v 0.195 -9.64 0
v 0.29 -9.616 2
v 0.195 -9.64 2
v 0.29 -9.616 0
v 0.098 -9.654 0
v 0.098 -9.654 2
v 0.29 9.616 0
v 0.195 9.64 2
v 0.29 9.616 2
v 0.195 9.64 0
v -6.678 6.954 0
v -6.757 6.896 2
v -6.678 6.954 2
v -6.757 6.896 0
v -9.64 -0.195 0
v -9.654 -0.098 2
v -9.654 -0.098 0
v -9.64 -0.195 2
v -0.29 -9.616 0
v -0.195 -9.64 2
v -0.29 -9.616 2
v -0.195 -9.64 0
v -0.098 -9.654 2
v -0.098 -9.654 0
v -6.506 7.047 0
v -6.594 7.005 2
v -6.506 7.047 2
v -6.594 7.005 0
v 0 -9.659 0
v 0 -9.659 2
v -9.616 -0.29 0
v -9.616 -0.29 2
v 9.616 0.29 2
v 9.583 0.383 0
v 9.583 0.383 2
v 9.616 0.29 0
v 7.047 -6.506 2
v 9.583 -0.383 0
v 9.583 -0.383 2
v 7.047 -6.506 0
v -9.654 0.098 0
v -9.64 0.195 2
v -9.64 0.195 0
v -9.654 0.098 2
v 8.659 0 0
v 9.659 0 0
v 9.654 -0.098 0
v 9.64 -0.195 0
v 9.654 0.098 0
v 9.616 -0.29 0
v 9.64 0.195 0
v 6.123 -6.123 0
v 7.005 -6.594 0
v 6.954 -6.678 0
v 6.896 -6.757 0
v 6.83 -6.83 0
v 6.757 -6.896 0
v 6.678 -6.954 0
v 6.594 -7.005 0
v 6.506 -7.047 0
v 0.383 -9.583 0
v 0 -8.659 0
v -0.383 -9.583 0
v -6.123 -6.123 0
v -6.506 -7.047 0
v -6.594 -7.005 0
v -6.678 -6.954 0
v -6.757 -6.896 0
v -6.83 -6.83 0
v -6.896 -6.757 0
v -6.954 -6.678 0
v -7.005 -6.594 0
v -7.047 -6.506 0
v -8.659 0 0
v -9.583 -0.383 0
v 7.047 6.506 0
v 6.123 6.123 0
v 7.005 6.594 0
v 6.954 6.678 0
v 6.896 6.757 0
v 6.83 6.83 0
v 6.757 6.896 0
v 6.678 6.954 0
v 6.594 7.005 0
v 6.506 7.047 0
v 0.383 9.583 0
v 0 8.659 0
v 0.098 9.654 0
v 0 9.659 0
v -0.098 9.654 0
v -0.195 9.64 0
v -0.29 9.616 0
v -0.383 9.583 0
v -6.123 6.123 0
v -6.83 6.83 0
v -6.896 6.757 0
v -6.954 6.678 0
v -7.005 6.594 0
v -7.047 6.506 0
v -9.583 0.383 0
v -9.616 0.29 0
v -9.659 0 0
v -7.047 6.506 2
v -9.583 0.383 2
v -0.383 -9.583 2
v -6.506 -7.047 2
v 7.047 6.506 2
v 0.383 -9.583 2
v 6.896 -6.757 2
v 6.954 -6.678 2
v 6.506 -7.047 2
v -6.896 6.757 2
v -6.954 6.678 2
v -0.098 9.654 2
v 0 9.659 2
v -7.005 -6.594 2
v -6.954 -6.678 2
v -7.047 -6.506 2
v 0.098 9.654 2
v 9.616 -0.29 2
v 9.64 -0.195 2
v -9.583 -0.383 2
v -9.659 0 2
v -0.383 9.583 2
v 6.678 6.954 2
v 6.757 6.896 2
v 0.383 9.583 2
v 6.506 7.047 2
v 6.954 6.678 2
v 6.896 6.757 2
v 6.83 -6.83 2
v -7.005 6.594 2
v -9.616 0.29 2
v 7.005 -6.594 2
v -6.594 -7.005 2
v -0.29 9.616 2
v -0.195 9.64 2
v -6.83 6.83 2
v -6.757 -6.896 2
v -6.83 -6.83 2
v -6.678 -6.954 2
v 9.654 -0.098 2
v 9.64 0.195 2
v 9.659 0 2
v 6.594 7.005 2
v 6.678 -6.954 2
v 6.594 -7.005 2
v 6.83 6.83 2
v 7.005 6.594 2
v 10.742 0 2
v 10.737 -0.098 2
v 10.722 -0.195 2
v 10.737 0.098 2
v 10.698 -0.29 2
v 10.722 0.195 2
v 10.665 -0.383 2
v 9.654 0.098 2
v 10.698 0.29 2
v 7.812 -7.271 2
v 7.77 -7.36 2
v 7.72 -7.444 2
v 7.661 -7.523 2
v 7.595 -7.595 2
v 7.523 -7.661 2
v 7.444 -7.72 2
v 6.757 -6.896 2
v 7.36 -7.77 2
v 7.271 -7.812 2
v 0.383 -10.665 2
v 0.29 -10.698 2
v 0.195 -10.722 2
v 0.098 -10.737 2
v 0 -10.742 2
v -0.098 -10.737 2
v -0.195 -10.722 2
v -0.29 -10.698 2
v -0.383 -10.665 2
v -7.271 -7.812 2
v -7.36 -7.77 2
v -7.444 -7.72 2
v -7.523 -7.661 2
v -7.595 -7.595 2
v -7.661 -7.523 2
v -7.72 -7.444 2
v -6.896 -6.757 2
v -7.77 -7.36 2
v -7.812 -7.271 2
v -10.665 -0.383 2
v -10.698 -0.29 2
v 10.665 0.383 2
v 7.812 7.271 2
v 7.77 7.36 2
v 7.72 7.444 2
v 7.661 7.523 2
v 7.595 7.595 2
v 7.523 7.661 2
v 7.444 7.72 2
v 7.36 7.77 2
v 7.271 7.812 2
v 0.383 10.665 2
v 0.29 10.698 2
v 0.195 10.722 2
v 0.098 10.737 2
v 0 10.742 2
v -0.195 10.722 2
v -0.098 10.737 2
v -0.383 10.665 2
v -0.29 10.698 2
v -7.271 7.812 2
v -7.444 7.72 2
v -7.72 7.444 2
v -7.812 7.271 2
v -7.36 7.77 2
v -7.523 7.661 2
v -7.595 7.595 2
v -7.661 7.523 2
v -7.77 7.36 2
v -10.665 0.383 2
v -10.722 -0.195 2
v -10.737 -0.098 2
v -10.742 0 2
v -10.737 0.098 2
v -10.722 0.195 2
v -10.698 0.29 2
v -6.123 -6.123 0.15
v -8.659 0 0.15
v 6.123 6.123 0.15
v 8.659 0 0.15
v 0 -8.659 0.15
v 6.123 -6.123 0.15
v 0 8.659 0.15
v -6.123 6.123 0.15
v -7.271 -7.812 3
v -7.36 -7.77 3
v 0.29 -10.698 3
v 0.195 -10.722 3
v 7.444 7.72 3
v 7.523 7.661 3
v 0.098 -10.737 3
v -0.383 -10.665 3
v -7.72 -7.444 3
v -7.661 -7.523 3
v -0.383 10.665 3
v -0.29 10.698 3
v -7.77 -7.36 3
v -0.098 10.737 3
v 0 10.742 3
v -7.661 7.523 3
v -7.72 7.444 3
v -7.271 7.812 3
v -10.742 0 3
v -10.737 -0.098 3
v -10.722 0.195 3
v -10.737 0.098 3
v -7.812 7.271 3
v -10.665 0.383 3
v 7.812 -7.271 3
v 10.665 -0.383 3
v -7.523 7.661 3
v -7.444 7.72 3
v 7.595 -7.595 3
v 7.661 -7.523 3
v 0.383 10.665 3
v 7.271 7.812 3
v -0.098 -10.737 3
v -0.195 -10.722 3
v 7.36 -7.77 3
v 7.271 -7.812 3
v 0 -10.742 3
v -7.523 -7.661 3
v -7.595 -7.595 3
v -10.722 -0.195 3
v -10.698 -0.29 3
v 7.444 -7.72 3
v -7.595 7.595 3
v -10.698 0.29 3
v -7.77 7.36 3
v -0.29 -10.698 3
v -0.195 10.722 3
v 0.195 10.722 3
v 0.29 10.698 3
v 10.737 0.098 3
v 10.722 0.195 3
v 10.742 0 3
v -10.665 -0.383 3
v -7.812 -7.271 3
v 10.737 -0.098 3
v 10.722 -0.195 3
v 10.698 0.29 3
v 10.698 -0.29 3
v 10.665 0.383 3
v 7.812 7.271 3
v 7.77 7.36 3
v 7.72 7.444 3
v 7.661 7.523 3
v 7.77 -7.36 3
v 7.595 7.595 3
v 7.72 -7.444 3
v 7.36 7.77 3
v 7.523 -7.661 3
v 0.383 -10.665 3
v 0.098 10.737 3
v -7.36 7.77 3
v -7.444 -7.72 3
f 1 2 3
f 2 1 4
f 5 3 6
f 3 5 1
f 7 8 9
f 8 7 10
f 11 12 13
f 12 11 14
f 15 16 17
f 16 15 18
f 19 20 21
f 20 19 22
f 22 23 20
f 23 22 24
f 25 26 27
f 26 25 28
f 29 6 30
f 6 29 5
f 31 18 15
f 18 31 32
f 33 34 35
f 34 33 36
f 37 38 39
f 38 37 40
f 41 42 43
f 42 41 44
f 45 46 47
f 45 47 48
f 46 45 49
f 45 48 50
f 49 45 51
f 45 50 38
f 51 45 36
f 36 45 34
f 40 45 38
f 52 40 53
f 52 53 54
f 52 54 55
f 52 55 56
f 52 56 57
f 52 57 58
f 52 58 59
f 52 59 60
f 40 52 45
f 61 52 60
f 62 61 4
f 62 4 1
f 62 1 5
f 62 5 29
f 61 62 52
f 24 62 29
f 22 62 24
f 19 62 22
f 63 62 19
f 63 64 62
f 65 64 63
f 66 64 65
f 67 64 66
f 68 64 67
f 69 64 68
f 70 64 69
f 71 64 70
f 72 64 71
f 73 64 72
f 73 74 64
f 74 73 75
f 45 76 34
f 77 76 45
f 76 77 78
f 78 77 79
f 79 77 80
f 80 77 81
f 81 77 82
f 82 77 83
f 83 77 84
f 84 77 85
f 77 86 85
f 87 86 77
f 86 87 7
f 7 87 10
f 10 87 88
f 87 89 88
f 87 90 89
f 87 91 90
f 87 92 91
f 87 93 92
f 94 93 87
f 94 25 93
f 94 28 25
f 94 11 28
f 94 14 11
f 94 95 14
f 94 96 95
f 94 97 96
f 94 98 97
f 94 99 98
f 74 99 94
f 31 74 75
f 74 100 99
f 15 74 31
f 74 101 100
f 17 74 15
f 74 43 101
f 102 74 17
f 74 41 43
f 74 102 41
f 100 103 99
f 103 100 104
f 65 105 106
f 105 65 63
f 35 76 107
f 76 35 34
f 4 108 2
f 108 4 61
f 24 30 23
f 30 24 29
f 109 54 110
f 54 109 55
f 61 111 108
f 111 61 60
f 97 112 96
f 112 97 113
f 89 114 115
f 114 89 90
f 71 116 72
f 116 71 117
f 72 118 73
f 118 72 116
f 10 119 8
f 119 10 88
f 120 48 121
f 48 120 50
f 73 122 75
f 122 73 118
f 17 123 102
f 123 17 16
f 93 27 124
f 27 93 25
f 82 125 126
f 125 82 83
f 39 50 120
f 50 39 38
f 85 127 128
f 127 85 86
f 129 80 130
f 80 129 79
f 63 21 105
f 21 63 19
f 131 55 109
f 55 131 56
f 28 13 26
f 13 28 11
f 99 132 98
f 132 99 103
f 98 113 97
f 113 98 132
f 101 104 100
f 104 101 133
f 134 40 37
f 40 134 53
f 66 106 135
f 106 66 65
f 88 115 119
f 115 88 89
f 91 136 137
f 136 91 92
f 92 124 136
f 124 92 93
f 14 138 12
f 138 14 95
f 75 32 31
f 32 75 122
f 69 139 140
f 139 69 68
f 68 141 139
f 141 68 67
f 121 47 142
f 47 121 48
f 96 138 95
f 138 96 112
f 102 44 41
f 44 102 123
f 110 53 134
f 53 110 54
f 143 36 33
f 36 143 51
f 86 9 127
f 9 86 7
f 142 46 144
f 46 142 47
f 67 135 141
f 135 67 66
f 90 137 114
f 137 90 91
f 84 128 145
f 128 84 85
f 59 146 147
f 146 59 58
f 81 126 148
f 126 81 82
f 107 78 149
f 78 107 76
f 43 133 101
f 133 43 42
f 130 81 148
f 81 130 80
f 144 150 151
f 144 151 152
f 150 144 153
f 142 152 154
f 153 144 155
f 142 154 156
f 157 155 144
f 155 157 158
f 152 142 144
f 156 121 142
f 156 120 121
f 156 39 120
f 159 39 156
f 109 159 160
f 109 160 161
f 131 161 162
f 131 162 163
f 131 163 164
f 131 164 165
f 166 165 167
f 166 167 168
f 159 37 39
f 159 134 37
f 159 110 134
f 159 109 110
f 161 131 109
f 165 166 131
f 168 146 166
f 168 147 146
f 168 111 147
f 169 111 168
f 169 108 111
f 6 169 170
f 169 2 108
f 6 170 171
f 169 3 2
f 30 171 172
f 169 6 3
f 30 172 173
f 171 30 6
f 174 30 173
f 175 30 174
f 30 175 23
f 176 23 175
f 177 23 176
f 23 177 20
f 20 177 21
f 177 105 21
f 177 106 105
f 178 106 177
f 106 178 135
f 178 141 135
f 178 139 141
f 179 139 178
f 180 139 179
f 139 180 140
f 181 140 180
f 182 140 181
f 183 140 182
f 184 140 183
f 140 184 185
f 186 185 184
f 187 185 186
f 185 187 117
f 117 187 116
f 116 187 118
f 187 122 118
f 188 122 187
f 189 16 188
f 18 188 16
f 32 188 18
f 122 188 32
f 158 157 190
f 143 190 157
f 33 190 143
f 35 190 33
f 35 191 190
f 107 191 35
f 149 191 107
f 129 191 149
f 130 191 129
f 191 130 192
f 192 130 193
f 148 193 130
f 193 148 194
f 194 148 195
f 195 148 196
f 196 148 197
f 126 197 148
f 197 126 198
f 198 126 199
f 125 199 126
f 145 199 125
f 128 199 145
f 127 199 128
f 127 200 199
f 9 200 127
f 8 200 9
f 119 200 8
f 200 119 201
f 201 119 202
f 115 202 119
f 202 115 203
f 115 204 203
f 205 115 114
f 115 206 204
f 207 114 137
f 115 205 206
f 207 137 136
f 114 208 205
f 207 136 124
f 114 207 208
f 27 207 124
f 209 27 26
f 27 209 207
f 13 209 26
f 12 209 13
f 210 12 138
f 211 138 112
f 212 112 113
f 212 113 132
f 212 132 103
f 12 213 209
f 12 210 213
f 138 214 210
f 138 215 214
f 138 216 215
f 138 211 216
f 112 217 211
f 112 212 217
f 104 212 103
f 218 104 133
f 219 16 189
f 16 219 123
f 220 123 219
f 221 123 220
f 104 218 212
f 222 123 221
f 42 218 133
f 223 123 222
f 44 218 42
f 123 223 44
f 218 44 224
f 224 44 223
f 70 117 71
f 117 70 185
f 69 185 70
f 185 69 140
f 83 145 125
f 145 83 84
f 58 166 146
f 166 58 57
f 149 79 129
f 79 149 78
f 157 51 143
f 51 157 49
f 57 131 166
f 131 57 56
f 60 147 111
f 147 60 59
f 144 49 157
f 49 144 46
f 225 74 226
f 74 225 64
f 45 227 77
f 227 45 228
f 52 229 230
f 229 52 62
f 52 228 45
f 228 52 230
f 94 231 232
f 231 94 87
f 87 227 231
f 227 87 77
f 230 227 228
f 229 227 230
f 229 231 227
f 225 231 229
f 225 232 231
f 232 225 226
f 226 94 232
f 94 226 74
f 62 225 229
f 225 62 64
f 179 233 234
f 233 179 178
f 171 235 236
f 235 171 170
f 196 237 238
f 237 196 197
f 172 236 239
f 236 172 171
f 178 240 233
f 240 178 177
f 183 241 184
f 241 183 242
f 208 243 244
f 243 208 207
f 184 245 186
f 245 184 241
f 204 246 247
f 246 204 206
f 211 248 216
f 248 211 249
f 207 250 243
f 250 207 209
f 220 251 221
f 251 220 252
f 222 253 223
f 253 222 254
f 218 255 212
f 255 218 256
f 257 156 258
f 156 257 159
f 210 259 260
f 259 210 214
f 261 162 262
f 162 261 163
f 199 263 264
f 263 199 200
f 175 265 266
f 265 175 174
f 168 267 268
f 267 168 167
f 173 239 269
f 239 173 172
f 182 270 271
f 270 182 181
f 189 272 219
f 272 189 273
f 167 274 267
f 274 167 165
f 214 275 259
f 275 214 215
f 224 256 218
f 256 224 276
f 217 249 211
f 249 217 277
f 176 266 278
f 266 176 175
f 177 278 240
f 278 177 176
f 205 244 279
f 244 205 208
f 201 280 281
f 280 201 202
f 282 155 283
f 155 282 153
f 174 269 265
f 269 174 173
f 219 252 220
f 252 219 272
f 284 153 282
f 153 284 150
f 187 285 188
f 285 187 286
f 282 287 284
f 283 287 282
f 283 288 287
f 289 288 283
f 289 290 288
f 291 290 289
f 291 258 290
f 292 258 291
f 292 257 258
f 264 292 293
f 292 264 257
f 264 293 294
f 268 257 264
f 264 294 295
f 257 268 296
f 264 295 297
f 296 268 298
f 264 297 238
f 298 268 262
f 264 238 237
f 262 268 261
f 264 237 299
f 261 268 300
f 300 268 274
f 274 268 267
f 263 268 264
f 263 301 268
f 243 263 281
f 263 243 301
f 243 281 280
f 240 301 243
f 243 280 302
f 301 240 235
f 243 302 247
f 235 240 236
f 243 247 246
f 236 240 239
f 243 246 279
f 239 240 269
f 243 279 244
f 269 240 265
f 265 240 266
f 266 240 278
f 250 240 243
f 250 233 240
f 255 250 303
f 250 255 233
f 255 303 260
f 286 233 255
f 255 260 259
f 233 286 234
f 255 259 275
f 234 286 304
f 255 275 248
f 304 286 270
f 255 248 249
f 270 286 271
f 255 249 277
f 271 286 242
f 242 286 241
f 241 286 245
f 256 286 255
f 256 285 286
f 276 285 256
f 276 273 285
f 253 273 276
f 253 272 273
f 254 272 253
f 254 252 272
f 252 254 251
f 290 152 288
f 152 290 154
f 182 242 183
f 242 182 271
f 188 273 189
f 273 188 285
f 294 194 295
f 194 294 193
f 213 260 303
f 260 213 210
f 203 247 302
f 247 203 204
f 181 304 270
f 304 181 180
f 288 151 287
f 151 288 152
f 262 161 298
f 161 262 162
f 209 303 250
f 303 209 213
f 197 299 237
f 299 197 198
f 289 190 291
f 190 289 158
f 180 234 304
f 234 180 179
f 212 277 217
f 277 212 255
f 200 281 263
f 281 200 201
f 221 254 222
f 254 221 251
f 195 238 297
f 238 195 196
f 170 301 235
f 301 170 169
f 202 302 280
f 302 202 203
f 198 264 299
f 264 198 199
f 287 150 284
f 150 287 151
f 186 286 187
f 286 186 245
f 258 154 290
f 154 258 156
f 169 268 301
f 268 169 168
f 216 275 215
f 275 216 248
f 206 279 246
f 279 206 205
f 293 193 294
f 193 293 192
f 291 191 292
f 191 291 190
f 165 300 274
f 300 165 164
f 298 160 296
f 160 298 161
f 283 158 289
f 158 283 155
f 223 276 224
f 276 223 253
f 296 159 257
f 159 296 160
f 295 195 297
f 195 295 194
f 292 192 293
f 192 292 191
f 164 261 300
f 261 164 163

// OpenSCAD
$fn=64;
wallThck=1;
hexBaseInDia=18;
hexTopInDia=20;
ovHght=3;
baseHght=2;
recessHght=0.25;
crnrRad=1;
corners=8;

/* [Hidden] */
hexBaseOutDia=hexBaseInDia/cos(180/corners);
hexTopOutDia=hexTopInDia/cos(180/corners);
crnrOutRad=crnrRad/cos(180/corners);
wallThckOutRad=wallThck/cos(180/corners);
fudge=0.1;

//top
translate([0,0,baseHght]) linear_extrude(ovHght-baseHght) offset(crnrRad) circle(d=hexTopOutDia-crnrOutRad*2,$fn=corners);
//base
difference(){
  linear_extrude(baseHght) offset(crnrRad) circle(d=hexBaseOutDia-crnrOutRad*2,$fn=corners);
  translate([0,0,-fudge]) linear_extrude(recessHght) offset(crnrRad-wallThck) circle(d=hexBaseOutDia-wallThckOutRad*2,$fn=corners);
}
